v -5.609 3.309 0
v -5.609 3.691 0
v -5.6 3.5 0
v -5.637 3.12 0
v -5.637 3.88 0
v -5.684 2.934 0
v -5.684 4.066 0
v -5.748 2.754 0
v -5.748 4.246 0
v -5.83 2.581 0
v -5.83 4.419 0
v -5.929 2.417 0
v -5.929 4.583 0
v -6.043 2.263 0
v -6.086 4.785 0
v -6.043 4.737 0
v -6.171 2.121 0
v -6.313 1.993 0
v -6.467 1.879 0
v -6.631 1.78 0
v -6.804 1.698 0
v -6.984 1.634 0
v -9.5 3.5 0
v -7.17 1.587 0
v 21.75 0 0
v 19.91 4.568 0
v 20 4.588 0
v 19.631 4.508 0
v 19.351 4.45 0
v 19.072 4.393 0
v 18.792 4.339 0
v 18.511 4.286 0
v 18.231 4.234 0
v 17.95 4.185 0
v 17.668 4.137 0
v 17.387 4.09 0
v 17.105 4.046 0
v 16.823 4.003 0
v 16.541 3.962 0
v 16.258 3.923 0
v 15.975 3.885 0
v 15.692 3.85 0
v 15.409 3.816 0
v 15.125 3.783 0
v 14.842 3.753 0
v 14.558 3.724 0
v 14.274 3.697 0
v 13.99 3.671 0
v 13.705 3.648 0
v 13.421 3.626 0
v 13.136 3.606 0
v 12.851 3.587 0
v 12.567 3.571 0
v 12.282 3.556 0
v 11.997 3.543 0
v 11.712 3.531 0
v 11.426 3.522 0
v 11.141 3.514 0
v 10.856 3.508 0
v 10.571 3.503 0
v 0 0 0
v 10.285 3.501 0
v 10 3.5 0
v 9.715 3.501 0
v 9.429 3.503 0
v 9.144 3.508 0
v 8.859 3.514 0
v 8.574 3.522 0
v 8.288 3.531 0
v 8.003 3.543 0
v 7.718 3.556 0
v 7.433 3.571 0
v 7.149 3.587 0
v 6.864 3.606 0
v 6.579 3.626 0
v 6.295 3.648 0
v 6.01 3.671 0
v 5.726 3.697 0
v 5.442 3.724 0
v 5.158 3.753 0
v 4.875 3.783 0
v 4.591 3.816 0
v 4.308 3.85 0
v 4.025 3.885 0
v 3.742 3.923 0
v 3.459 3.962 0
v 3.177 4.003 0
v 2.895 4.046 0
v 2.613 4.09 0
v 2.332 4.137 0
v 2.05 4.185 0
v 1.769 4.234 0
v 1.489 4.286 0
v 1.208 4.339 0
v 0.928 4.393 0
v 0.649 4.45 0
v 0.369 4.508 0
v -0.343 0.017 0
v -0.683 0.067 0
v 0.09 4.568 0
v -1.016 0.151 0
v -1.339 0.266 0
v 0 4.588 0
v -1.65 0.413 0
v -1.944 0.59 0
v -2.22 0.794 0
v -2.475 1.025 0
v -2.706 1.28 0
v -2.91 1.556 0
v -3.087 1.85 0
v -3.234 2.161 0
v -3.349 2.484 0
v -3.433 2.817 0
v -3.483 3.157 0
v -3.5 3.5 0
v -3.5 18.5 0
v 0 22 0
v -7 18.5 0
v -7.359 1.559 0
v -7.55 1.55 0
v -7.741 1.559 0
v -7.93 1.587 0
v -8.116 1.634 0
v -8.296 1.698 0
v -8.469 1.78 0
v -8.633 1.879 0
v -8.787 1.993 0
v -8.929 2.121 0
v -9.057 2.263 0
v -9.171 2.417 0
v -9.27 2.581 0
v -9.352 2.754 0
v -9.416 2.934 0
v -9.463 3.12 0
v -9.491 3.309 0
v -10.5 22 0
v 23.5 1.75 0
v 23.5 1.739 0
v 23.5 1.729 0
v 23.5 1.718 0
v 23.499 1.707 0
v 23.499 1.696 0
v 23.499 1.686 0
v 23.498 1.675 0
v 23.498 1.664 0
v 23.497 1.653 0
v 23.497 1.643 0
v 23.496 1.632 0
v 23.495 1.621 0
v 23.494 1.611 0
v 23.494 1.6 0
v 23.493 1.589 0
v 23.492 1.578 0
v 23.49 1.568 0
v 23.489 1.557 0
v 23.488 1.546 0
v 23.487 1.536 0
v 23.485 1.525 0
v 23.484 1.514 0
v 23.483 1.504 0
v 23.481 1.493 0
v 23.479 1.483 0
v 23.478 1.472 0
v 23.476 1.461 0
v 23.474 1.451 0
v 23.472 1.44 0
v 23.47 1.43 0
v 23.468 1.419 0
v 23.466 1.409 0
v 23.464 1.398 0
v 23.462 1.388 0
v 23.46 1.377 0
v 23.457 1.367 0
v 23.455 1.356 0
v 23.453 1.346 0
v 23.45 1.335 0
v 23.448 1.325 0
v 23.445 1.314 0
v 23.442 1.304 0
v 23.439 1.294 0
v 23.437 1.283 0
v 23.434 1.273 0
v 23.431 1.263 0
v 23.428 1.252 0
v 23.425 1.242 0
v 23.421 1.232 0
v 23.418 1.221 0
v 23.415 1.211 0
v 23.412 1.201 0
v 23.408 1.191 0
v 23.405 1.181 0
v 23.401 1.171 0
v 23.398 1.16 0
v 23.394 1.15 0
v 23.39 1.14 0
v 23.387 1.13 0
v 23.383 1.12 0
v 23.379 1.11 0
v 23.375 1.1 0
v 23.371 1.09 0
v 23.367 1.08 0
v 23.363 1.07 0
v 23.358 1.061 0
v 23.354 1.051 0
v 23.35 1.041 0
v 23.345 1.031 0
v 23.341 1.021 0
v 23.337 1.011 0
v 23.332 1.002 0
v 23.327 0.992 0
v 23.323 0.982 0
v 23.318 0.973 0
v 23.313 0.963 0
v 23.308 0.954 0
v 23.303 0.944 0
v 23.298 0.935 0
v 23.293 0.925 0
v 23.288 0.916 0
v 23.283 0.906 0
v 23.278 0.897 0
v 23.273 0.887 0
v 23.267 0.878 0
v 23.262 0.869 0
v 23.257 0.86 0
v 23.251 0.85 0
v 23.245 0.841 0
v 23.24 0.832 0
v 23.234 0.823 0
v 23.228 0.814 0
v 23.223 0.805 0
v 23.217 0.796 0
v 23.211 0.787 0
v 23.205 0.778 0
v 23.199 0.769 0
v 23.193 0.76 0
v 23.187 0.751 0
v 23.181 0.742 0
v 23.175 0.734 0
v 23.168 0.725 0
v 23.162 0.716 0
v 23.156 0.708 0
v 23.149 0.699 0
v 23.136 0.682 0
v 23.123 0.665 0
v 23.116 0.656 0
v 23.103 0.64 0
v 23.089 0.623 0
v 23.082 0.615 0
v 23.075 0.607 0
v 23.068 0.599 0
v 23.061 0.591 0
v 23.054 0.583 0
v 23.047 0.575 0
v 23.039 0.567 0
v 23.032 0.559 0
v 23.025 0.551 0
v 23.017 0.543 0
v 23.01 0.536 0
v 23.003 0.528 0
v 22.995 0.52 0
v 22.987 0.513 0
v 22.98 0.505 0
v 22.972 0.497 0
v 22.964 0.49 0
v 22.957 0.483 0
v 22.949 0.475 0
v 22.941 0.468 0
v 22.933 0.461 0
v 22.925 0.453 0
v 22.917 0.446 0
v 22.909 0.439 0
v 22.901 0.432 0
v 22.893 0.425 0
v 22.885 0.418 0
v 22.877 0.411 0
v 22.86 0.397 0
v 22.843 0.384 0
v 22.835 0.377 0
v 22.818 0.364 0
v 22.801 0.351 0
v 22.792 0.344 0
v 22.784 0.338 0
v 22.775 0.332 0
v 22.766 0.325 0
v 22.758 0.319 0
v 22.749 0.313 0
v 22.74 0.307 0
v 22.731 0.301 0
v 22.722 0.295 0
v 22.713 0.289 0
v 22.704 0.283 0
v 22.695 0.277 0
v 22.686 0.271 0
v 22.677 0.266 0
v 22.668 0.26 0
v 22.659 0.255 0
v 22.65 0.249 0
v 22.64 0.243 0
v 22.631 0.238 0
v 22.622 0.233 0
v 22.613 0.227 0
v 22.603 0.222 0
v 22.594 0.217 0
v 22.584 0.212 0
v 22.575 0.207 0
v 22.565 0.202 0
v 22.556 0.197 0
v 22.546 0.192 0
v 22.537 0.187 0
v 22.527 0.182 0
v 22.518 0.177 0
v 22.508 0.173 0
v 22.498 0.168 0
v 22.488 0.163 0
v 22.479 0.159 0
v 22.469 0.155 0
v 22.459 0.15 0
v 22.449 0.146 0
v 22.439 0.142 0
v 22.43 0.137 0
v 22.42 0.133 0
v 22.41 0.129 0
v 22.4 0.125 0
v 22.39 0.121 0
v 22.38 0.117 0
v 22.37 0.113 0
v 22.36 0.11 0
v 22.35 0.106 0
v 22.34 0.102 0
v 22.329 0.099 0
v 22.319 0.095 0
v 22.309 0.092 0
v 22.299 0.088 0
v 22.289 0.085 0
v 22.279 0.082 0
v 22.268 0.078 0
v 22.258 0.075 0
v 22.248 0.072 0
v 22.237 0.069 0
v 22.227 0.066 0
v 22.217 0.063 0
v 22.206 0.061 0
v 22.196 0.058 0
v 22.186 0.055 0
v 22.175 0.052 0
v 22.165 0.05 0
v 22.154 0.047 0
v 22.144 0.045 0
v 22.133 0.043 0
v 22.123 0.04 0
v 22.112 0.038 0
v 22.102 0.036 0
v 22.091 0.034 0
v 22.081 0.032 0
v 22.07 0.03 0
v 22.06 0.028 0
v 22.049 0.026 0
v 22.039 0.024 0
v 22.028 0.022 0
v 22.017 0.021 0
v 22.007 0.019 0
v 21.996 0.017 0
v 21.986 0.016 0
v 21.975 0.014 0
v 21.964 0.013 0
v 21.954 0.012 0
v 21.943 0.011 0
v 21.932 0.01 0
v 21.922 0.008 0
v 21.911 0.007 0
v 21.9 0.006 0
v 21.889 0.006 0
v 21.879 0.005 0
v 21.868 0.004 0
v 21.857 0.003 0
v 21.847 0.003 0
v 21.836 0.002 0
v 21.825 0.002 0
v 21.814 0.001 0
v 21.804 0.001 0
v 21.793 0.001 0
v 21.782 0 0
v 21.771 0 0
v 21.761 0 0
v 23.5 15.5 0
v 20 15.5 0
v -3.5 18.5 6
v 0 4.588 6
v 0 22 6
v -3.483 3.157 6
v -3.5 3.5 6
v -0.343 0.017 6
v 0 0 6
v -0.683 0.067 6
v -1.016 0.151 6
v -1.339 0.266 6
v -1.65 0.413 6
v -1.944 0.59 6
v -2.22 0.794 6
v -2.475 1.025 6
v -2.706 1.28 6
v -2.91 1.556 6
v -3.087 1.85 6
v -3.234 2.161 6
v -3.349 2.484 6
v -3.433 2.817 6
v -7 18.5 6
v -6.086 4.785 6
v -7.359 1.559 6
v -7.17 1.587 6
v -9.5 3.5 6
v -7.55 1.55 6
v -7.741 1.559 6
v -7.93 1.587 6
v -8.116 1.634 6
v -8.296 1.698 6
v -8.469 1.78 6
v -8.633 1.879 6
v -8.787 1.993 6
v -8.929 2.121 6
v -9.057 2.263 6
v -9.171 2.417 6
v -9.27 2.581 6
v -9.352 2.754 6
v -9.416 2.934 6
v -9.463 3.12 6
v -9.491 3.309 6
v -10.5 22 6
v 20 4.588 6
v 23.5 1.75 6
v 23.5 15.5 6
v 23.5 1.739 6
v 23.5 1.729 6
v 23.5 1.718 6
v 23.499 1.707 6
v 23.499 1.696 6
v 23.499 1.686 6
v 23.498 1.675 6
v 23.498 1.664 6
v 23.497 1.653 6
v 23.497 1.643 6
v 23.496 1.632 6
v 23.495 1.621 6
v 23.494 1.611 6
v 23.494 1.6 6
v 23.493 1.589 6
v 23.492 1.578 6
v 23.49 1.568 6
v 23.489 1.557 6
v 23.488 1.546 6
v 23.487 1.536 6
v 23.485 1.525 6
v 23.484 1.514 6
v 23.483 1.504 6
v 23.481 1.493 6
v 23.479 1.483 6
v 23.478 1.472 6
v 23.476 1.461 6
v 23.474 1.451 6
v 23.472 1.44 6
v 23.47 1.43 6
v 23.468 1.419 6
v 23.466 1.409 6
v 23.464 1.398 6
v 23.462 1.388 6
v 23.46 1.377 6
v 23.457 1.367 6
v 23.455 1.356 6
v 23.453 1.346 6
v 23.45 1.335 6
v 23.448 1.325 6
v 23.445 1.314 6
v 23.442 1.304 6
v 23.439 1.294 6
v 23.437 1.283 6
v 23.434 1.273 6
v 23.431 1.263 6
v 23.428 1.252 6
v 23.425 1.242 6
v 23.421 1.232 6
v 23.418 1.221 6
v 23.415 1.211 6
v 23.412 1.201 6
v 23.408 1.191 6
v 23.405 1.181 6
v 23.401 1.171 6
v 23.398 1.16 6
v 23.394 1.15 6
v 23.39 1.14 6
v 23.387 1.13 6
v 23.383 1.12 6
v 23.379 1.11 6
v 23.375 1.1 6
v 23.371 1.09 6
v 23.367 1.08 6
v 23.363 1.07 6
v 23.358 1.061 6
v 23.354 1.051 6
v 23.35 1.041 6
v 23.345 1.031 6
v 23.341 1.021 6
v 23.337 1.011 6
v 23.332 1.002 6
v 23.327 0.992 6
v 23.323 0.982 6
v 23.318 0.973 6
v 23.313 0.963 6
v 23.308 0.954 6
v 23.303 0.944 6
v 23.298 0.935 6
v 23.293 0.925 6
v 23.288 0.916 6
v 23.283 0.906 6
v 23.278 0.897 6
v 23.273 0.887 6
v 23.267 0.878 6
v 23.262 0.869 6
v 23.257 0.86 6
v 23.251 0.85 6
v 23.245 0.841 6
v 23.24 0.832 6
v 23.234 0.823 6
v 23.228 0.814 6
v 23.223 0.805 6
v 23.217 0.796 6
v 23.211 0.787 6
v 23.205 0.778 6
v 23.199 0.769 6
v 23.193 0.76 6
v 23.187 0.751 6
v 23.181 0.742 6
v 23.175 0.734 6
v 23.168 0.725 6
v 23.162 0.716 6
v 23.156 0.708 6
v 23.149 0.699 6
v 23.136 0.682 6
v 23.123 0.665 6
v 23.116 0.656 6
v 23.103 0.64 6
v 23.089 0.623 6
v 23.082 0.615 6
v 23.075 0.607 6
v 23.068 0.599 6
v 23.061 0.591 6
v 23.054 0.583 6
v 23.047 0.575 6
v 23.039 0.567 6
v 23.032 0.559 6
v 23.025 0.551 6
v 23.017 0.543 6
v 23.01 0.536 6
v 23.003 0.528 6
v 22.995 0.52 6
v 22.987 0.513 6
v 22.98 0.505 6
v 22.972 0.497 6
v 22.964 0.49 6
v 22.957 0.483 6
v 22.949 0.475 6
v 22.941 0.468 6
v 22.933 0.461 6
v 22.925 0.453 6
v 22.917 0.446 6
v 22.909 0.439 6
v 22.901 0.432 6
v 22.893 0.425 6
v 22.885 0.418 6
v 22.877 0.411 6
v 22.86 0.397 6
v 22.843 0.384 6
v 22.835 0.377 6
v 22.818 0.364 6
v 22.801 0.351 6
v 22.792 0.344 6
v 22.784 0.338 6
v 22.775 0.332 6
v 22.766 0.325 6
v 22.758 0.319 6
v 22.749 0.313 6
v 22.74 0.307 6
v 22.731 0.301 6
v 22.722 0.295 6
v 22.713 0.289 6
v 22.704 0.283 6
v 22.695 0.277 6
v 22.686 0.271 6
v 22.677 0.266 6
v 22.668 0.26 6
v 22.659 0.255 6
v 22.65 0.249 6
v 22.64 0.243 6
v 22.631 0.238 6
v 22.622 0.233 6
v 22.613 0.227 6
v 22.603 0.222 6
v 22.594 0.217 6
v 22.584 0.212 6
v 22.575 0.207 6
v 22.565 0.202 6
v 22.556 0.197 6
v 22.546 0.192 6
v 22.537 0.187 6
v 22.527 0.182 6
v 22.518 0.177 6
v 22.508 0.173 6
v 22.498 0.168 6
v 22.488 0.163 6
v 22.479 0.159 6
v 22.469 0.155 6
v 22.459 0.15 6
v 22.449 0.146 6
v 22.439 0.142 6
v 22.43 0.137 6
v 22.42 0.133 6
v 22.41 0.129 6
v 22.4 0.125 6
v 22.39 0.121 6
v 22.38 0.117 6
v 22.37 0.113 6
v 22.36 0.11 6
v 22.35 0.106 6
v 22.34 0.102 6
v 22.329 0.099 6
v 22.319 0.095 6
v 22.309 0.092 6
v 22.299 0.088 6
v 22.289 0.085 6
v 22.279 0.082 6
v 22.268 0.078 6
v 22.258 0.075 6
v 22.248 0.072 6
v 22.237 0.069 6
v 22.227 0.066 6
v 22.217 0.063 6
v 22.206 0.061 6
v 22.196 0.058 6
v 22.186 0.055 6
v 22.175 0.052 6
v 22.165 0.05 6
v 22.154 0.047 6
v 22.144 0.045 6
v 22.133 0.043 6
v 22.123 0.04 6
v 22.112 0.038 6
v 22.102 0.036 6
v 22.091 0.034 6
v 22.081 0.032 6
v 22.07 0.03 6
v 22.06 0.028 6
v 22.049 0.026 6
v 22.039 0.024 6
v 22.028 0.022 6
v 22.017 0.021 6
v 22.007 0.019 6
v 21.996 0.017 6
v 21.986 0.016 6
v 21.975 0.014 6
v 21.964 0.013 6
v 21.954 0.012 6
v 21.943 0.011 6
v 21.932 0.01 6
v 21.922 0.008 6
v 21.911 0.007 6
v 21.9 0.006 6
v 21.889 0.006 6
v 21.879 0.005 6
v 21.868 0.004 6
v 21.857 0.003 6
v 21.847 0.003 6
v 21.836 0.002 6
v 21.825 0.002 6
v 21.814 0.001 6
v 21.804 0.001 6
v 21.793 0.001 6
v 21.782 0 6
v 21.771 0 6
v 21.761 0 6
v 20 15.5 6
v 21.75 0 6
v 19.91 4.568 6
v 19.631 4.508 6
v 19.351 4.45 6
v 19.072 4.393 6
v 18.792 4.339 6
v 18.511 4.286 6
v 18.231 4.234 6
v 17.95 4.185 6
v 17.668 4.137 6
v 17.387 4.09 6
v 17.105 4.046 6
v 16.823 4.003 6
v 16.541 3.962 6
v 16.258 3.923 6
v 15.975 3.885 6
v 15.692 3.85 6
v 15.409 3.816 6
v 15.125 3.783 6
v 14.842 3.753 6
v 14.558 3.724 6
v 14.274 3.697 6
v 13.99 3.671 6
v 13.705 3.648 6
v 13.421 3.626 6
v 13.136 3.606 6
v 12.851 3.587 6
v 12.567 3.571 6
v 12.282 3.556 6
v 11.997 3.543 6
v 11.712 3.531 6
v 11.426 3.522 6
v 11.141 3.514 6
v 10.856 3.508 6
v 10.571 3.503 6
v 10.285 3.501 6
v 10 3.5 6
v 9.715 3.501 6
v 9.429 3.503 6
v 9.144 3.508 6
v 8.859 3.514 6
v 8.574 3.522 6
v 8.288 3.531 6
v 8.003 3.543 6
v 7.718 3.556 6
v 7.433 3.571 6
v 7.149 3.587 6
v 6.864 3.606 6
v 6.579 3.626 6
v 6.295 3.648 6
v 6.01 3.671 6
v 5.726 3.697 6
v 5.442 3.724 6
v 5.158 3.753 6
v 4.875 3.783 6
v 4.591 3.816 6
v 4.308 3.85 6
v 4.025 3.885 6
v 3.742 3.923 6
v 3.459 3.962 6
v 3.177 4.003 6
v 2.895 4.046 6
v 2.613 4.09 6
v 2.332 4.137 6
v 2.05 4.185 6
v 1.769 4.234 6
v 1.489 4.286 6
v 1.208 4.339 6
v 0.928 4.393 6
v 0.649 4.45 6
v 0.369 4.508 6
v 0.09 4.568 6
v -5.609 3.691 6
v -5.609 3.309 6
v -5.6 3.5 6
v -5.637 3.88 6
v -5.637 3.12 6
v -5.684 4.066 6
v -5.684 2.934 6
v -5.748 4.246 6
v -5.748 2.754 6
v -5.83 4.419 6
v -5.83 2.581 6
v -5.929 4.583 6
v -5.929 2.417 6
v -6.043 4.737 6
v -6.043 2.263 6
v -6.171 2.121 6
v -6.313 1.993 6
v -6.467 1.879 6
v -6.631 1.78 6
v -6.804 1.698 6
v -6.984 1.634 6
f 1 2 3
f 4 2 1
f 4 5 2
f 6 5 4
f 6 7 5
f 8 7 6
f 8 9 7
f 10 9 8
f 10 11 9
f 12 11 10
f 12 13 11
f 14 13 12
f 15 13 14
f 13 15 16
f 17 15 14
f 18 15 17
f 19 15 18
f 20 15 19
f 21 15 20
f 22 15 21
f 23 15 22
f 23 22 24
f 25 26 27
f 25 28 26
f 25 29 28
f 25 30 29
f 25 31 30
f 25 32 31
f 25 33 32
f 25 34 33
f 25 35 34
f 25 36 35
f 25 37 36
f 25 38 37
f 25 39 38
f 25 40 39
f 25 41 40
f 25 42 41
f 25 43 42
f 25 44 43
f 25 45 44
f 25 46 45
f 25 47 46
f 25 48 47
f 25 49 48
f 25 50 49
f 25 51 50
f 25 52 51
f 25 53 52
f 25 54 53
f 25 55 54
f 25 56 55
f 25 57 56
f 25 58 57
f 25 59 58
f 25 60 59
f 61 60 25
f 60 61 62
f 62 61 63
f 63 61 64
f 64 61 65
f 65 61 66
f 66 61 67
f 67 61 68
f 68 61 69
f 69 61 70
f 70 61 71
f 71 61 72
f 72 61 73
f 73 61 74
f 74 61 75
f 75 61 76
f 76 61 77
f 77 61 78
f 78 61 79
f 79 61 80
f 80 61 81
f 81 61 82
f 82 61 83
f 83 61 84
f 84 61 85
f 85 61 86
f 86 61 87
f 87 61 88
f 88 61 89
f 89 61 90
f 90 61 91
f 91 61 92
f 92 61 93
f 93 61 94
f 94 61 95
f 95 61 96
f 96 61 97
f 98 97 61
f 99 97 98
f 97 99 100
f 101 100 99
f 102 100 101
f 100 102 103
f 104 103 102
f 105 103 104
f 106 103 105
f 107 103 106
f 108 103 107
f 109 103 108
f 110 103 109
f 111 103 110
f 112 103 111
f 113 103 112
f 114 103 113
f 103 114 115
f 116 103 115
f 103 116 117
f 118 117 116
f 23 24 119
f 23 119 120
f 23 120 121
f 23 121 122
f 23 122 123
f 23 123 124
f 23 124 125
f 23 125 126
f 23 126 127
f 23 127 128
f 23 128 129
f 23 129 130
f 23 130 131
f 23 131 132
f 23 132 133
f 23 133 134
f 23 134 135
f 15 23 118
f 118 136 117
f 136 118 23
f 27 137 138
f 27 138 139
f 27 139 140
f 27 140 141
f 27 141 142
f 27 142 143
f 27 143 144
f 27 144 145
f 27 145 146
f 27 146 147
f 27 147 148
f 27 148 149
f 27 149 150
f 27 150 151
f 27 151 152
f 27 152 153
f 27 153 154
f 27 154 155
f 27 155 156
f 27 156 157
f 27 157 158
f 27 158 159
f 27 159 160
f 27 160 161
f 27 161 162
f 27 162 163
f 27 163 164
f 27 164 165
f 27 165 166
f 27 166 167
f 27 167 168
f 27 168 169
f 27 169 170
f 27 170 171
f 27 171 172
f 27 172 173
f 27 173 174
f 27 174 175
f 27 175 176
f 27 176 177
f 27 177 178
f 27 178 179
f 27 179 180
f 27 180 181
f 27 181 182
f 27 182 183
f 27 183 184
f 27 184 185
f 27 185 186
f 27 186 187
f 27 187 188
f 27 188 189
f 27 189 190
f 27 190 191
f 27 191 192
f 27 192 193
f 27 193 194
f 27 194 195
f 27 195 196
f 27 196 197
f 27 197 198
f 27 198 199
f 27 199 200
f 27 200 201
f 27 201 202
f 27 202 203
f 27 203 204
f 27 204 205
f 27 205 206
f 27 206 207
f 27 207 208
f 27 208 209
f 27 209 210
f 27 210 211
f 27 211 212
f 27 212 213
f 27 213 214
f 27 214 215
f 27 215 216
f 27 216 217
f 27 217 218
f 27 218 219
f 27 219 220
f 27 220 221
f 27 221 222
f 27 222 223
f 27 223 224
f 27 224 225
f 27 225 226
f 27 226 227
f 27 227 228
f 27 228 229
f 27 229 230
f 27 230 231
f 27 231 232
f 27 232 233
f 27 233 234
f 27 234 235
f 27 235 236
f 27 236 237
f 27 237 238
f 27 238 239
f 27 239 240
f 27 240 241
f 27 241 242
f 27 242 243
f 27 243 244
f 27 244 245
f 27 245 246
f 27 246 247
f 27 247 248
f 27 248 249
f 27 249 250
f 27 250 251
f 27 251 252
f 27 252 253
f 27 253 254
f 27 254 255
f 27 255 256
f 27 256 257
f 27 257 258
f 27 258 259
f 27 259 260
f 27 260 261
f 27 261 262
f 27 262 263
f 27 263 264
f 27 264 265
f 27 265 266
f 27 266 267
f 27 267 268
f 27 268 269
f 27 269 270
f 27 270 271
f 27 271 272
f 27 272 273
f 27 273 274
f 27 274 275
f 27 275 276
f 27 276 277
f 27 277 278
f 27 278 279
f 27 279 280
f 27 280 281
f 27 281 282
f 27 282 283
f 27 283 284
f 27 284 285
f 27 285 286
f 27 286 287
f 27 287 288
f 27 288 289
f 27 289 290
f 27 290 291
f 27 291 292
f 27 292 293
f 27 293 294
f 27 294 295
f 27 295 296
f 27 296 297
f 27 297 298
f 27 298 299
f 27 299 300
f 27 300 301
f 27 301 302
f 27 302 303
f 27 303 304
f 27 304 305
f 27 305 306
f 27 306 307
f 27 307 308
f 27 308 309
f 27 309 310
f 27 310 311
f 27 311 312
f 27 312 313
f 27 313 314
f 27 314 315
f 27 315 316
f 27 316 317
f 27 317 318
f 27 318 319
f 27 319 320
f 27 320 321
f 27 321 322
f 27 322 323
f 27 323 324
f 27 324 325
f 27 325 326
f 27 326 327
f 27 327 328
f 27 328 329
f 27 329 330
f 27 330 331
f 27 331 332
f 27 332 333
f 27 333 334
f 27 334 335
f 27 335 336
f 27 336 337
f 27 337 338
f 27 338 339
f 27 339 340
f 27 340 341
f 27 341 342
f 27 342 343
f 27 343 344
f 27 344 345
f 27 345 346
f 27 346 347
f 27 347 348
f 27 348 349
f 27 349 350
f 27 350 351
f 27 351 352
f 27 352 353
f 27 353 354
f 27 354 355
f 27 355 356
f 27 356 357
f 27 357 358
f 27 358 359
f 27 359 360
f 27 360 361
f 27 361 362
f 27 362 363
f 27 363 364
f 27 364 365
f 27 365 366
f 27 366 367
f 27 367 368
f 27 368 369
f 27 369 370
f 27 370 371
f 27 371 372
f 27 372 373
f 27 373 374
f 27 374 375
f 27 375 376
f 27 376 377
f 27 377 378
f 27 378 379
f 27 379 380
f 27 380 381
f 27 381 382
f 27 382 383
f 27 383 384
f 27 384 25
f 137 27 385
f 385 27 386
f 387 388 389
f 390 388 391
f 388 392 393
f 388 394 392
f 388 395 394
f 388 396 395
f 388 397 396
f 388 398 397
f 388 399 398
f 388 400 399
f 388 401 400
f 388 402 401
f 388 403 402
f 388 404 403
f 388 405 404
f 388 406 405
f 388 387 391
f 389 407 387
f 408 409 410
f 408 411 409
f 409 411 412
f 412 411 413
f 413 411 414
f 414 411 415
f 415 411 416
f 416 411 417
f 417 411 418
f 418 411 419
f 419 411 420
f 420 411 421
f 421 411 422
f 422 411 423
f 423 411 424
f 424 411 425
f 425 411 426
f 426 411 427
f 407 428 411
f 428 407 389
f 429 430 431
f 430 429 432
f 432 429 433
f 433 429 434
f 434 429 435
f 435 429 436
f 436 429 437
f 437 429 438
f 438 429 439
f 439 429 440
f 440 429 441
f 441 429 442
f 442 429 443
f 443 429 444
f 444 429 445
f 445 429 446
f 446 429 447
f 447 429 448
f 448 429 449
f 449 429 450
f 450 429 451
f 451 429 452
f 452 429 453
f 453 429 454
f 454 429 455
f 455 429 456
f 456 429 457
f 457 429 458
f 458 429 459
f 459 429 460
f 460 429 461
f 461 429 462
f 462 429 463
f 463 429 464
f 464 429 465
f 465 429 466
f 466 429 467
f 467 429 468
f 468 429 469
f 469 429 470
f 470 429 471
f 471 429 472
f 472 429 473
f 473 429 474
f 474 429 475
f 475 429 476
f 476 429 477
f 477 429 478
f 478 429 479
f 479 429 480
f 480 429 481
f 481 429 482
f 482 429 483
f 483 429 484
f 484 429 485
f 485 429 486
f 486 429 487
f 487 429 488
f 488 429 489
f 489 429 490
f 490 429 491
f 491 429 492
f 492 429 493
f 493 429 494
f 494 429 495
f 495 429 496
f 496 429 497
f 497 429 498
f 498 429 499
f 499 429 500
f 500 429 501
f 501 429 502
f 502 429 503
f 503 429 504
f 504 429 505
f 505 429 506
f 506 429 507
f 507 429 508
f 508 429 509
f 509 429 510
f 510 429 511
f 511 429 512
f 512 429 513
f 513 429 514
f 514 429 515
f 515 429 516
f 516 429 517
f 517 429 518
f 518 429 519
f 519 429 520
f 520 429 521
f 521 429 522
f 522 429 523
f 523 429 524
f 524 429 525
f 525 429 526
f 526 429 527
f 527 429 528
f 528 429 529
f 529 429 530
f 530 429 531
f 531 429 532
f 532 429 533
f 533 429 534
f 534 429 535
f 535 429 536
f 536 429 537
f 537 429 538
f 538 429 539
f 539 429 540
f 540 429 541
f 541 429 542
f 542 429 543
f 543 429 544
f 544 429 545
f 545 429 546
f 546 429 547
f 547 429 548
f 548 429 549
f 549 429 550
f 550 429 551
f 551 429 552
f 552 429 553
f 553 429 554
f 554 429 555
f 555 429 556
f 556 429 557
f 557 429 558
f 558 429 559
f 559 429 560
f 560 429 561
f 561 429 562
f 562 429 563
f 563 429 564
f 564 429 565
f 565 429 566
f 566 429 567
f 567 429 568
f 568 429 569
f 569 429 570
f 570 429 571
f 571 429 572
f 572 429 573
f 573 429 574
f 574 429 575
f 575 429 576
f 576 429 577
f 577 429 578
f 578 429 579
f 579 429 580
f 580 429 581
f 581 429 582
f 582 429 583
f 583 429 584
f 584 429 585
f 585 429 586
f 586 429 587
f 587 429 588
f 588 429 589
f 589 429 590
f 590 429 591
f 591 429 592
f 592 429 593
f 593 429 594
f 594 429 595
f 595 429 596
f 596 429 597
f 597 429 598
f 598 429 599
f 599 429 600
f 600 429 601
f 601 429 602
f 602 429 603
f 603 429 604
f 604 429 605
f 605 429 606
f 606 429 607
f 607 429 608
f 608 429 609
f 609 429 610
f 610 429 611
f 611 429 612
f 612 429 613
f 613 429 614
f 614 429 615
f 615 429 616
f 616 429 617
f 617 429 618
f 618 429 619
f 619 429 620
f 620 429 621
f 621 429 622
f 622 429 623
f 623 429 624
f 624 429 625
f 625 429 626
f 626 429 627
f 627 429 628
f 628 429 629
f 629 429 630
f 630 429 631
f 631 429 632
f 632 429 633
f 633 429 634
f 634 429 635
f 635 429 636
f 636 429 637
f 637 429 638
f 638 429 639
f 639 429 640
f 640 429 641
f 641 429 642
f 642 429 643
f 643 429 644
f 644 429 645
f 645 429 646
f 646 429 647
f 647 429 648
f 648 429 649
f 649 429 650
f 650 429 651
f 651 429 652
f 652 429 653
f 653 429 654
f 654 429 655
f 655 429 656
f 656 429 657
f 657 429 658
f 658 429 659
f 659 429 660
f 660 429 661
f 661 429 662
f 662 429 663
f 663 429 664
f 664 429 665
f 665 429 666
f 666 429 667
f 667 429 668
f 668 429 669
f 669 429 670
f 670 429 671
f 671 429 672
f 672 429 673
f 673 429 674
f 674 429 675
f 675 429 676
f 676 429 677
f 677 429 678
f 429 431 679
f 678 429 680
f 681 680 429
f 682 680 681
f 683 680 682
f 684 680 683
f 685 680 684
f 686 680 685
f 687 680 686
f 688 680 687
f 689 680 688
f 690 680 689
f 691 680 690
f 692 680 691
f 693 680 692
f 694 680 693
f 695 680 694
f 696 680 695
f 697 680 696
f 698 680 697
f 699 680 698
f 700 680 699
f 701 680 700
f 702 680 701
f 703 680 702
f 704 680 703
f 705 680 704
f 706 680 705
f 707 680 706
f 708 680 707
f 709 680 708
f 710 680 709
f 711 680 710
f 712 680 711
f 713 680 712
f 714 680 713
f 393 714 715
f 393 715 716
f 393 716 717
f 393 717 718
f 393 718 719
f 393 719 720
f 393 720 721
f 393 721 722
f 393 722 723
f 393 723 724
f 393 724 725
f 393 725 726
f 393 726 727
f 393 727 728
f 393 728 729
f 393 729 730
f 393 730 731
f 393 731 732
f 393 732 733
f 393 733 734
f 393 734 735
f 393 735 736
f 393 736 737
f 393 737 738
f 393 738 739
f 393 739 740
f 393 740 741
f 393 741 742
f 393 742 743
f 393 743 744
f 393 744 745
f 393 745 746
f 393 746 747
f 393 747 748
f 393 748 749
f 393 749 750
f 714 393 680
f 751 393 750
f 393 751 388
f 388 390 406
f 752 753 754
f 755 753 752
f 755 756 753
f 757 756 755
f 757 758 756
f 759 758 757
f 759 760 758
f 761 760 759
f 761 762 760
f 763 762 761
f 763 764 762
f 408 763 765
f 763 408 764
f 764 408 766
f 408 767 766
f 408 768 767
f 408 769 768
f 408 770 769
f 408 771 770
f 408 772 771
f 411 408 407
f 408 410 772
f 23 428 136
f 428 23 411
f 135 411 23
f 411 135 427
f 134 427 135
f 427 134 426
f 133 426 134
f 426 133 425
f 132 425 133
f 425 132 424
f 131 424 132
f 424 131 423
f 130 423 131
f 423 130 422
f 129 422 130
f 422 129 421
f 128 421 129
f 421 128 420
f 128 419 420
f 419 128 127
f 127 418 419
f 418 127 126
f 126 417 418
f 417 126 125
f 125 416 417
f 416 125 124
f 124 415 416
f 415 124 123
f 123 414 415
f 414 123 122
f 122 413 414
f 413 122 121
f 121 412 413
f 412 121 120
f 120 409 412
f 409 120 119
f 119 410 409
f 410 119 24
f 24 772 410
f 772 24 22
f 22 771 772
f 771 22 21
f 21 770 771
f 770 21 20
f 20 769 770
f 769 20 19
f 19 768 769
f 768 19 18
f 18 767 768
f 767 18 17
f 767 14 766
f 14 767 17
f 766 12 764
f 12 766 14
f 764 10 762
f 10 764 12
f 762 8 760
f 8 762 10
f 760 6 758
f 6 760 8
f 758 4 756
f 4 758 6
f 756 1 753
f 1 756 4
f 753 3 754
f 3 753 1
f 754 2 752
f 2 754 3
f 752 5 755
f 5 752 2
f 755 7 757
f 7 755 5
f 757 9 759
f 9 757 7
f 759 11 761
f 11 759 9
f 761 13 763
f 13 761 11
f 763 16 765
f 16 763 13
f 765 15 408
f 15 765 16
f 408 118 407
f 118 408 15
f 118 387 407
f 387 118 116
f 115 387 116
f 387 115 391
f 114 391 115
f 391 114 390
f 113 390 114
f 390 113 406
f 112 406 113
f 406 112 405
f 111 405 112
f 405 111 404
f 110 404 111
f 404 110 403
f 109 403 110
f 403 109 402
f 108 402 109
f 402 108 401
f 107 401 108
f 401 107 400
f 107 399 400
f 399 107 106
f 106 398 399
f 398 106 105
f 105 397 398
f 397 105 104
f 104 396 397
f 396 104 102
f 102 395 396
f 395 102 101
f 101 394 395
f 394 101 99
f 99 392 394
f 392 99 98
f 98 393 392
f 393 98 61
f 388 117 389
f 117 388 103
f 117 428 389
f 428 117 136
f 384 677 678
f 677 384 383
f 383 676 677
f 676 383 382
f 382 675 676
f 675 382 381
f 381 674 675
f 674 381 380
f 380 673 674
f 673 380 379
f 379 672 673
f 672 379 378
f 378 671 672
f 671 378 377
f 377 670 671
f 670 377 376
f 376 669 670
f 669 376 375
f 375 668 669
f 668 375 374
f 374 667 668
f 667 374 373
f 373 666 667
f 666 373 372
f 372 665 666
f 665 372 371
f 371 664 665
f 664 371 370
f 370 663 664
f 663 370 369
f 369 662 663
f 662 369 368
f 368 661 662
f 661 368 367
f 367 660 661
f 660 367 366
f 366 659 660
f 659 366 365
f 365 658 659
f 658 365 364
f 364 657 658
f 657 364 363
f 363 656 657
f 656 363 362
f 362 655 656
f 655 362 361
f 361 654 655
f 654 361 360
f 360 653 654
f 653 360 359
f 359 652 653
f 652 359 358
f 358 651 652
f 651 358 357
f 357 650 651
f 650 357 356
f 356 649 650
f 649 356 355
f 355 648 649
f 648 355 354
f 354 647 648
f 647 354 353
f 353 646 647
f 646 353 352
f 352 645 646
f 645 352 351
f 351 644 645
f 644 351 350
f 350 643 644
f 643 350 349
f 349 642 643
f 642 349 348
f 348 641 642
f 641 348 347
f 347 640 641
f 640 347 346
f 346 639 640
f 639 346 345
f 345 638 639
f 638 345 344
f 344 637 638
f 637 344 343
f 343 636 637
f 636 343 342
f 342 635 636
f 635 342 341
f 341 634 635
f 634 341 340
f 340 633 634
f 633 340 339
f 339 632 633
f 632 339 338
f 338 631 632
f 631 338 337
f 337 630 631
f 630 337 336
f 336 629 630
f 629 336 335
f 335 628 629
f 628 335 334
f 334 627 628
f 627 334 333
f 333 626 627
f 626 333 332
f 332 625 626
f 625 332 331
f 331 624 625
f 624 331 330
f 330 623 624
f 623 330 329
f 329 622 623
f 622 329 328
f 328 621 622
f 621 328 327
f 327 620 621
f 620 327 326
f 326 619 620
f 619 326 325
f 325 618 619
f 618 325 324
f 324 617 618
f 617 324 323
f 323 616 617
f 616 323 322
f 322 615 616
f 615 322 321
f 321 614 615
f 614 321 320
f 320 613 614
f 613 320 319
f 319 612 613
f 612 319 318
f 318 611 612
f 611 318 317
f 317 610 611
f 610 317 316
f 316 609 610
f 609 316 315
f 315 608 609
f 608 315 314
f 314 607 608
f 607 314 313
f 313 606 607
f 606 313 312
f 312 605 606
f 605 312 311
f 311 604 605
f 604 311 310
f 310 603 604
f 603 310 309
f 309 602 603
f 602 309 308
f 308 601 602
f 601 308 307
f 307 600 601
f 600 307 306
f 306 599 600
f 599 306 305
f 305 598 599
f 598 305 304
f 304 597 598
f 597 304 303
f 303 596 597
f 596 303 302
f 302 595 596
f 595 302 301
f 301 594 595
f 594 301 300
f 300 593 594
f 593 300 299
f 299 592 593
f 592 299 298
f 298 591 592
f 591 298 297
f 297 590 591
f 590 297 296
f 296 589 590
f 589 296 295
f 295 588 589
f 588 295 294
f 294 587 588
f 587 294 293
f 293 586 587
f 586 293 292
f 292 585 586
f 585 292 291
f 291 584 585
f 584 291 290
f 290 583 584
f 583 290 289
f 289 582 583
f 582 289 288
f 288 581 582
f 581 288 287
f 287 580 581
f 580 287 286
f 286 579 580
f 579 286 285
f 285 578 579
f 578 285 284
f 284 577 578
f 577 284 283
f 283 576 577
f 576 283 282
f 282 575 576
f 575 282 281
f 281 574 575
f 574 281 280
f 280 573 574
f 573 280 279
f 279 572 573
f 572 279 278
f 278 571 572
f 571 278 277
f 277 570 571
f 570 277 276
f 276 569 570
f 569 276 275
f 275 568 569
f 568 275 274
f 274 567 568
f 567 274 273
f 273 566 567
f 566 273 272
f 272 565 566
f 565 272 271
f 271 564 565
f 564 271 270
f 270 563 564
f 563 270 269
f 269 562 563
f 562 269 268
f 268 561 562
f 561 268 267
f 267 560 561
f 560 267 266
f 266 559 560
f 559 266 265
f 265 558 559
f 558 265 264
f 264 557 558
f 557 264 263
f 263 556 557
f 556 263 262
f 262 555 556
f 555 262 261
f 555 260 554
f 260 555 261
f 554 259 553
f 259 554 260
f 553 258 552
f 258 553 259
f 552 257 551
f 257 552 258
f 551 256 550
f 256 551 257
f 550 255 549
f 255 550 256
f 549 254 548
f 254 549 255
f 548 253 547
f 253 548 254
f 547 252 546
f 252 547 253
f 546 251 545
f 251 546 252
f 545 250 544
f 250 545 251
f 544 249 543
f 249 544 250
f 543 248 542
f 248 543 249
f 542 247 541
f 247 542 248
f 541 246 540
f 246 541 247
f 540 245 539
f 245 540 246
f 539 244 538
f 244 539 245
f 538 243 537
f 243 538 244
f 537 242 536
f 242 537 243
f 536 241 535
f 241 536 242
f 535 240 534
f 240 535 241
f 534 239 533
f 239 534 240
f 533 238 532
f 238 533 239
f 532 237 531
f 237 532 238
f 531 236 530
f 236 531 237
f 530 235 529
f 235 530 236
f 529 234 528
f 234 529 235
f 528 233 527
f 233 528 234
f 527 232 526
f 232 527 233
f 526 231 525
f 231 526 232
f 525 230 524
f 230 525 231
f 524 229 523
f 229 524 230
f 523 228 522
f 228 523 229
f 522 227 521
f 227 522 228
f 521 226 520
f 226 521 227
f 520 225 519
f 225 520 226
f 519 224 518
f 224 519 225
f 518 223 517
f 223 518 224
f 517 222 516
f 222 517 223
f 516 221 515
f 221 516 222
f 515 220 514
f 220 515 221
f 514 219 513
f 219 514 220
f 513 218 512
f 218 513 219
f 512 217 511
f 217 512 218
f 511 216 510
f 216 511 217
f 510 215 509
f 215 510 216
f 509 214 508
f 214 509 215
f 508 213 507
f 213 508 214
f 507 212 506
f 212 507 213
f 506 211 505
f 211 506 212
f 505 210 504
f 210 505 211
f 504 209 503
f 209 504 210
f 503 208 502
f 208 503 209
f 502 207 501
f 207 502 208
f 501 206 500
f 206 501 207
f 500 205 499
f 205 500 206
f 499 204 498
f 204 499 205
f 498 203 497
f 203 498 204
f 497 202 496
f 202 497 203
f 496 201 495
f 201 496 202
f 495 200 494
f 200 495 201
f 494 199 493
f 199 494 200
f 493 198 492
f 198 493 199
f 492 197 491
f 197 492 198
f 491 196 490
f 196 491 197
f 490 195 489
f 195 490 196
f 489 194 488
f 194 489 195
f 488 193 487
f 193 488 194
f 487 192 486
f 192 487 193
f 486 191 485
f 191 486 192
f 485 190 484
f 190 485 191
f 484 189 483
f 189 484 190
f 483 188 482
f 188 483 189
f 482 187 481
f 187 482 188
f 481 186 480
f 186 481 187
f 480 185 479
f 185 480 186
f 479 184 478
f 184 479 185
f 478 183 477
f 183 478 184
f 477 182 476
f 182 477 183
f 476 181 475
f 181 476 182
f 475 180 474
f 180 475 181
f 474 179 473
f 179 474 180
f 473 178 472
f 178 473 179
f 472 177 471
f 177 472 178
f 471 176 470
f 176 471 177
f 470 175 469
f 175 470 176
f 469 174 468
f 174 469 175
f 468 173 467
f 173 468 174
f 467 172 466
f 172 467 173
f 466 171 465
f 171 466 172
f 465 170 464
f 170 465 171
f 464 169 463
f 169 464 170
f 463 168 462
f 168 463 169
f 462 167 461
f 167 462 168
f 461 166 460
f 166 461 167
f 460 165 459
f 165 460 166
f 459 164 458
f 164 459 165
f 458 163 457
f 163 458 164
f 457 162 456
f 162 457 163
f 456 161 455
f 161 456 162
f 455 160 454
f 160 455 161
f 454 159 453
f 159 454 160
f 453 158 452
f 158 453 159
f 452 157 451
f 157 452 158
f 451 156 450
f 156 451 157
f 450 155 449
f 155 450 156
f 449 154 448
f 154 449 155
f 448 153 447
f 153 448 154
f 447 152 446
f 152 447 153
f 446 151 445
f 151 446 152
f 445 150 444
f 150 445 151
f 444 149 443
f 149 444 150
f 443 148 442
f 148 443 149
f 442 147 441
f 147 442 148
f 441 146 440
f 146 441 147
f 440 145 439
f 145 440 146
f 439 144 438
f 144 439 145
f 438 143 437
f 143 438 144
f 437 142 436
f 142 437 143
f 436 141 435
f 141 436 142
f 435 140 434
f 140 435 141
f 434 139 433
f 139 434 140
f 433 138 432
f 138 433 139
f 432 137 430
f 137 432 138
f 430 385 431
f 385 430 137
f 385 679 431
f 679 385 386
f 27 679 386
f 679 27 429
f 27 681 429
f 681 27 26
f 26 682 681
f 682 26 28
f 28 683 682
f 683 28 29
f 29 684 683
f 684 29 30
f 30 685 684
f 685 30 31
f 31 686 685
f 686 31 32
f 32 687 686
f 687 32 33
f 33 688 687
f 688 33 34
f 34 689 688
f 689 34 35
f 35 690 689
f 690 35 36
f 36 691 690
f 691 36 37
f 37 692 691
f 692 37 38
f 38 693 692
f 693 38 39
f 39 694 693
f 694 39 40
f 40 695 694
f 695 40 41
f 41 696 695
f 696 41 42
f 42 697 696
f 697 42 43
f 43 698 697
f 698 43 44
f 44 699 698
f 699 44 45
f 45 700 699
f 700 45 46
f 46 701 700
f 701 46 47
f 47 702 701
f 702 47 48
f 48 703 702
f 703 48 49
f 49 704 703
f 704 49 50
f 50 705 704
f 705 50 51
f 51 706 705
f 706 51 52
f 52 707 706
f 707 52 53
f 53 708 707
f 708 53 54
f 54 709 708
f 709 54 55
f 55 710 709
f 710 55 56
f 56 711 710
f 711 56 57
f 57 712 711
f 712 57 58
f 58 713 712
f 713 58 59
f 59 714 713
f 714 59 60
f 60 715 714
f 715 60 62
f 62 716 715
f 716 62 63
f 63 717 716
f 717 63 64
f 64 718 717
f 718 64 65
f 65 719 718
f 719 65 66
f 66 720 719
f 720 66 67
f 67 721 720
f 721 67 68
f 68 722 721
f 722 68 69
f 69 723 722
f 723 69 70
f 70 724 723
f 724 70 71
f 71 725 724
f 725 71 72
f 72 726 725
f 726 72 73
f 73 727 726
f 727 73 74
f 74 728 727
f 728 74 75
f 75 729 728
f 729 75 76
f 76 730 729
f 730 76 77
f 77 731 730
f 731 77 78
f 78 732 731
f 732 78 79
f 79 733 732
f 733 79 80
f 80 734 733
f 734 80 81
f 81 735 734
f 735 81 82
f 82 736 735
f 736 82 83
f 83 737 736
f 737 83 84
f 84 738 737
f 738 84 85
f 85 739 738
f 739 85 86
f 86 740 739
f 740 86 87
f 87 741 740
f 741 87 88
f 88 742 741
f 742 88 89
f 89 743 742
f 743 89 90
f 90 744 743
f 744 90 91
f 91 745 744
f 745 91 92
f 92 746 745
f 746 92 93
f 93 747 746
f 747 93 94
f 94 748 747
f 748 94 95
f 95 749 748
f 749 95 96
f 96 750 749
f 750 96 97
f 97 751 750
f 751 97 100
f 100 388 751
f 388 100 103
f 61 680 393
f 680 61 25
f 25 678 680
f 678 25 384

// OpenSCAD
hook_top_d = 3.5;
hook_bot_d = 2.5;
hook_taper = hook_top_d - hook_bot_d;
clip_h = 22;
clip_w = 6;

module clip(th) {
  clip_d = th + hook_top_d + th;
  clip_latch_th = th + 0.4;
  $fn = 64;
  translate([-clip_d, 0, 0]) {
    linear_extrude(clip_w) {
      polygon([
        [0, clip_h],
        [th + hook_top_d + th, clip_h],
        [th + hook_top_d + th,          th],
        [th + hook_top_d          ,          th],
        [th + hook_top_d          , clip_h - th],
        [th                       , clip_h - th],
        [th + hook_taper          ,          th],
        [          hook_taper          ,          th],
      ]);
      translate([clip_latch_th / 2 + hook_taper, th]) {
        circle(d=clip_latch_th);
      }
      translate([th + hook_top_d + th, th]) {
        difference() {
          circle(r=th);
          translate([0, -th])
            square([th, 2 * th]);
        }
      }
    }
  }
}

module teapot_hook(th, x, y, z, r) {
  clip(th);
  $fn = 1024;
  linear_extrude(z) {
    difference() {
      square([x, y]);
      translate([x / 2, r]) circle(r=r - th);
      translate([0 - r, 0]) square([r, r]);
      translate([x / 2 - r, r]) square([r, r]);
      translate([x / 2, r]) square([r, r]);
      translate([x, 0]) square([r, r]);
    }
    translate([x, th/2]) square([th, y + th/2]);
    translate([x, 0]) square([th/2, th]);
    translate([x + th/2, th/2]) circle(d=th);
  }
}

teapot_hook(3.5, 20, 12, clip_w, 50);
